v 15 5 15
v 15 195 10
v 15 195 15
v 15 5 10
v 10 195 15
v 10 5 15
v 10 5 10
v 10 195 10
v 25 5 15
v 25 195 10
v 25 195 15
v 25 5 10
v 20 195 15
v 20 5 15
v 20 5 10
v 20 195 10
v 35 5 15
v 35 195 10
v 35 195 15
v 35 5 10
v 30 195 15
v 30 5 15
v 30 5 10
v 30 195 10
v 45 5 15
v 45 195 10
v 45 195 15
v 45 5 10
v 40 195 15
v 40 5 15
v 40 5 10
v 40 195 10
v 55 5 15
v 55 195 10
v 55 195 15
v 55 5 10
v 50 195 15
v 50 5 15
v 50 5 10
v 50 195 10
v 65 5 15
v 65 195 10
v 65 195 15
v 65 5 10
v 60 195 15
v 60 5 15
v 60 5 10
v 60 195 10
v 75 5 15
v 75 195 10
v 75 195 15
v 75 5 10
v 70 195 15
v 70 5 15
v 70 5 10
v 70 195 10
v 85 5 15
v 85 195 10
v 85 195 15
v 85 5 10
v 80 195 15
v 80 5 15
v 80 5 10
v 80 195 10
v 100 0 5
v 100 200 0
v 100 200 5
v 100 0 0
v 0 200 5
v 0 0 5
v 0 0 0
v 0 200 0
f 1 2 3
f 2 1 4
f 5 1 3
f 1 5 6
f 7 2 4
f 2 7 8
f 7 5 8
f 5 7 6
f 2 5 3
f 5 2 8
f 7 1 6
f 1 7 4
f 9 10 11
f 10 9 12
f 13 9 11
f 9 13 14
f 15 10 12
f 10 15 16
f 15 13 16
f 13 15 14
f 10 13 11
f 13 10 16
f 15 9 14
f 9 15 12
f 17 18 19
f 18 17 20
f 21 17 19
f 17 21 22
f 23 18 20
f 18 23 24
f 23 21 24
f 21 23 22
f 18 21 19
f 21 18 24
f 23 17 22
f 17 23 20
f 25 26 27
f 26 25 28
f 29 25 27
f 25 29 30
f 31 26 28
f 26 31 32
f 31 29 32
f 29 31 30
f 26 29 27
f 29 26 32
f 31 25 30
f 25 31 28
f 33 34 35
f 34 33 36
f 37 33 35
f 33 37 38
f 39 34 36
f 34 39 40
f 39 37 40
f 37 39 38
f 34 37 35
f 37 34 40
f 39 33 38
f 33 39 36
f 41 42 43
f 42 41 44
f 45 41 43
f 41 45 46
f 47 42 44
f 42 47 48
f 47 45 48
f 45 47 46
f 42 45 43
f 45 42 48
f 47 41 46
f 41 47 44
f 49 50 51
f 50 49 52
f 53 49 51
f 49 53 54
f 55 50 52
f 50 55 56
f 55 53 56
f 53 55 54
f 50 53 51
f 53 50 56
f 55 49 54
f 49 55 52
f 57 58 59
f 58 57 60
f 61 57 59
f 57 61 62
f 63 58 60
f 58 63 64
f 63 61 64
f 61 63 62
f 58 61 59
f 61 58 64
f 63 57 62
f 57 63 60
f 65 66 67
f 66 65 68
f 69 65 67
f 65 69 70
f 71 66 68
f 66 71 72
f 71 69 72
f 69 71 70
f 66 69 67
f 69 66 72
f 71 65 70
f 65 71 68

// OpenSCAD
w = 100;
l = 200;
h = 5;

hw = 5;
hg = 5;
count = w / 10-2;
cube([w,l,h]);


for(i = [1:count]){
    translate([i * (hw+hg),5,10])
    color("pink")
    cube([hw,l-10,5]);
}
